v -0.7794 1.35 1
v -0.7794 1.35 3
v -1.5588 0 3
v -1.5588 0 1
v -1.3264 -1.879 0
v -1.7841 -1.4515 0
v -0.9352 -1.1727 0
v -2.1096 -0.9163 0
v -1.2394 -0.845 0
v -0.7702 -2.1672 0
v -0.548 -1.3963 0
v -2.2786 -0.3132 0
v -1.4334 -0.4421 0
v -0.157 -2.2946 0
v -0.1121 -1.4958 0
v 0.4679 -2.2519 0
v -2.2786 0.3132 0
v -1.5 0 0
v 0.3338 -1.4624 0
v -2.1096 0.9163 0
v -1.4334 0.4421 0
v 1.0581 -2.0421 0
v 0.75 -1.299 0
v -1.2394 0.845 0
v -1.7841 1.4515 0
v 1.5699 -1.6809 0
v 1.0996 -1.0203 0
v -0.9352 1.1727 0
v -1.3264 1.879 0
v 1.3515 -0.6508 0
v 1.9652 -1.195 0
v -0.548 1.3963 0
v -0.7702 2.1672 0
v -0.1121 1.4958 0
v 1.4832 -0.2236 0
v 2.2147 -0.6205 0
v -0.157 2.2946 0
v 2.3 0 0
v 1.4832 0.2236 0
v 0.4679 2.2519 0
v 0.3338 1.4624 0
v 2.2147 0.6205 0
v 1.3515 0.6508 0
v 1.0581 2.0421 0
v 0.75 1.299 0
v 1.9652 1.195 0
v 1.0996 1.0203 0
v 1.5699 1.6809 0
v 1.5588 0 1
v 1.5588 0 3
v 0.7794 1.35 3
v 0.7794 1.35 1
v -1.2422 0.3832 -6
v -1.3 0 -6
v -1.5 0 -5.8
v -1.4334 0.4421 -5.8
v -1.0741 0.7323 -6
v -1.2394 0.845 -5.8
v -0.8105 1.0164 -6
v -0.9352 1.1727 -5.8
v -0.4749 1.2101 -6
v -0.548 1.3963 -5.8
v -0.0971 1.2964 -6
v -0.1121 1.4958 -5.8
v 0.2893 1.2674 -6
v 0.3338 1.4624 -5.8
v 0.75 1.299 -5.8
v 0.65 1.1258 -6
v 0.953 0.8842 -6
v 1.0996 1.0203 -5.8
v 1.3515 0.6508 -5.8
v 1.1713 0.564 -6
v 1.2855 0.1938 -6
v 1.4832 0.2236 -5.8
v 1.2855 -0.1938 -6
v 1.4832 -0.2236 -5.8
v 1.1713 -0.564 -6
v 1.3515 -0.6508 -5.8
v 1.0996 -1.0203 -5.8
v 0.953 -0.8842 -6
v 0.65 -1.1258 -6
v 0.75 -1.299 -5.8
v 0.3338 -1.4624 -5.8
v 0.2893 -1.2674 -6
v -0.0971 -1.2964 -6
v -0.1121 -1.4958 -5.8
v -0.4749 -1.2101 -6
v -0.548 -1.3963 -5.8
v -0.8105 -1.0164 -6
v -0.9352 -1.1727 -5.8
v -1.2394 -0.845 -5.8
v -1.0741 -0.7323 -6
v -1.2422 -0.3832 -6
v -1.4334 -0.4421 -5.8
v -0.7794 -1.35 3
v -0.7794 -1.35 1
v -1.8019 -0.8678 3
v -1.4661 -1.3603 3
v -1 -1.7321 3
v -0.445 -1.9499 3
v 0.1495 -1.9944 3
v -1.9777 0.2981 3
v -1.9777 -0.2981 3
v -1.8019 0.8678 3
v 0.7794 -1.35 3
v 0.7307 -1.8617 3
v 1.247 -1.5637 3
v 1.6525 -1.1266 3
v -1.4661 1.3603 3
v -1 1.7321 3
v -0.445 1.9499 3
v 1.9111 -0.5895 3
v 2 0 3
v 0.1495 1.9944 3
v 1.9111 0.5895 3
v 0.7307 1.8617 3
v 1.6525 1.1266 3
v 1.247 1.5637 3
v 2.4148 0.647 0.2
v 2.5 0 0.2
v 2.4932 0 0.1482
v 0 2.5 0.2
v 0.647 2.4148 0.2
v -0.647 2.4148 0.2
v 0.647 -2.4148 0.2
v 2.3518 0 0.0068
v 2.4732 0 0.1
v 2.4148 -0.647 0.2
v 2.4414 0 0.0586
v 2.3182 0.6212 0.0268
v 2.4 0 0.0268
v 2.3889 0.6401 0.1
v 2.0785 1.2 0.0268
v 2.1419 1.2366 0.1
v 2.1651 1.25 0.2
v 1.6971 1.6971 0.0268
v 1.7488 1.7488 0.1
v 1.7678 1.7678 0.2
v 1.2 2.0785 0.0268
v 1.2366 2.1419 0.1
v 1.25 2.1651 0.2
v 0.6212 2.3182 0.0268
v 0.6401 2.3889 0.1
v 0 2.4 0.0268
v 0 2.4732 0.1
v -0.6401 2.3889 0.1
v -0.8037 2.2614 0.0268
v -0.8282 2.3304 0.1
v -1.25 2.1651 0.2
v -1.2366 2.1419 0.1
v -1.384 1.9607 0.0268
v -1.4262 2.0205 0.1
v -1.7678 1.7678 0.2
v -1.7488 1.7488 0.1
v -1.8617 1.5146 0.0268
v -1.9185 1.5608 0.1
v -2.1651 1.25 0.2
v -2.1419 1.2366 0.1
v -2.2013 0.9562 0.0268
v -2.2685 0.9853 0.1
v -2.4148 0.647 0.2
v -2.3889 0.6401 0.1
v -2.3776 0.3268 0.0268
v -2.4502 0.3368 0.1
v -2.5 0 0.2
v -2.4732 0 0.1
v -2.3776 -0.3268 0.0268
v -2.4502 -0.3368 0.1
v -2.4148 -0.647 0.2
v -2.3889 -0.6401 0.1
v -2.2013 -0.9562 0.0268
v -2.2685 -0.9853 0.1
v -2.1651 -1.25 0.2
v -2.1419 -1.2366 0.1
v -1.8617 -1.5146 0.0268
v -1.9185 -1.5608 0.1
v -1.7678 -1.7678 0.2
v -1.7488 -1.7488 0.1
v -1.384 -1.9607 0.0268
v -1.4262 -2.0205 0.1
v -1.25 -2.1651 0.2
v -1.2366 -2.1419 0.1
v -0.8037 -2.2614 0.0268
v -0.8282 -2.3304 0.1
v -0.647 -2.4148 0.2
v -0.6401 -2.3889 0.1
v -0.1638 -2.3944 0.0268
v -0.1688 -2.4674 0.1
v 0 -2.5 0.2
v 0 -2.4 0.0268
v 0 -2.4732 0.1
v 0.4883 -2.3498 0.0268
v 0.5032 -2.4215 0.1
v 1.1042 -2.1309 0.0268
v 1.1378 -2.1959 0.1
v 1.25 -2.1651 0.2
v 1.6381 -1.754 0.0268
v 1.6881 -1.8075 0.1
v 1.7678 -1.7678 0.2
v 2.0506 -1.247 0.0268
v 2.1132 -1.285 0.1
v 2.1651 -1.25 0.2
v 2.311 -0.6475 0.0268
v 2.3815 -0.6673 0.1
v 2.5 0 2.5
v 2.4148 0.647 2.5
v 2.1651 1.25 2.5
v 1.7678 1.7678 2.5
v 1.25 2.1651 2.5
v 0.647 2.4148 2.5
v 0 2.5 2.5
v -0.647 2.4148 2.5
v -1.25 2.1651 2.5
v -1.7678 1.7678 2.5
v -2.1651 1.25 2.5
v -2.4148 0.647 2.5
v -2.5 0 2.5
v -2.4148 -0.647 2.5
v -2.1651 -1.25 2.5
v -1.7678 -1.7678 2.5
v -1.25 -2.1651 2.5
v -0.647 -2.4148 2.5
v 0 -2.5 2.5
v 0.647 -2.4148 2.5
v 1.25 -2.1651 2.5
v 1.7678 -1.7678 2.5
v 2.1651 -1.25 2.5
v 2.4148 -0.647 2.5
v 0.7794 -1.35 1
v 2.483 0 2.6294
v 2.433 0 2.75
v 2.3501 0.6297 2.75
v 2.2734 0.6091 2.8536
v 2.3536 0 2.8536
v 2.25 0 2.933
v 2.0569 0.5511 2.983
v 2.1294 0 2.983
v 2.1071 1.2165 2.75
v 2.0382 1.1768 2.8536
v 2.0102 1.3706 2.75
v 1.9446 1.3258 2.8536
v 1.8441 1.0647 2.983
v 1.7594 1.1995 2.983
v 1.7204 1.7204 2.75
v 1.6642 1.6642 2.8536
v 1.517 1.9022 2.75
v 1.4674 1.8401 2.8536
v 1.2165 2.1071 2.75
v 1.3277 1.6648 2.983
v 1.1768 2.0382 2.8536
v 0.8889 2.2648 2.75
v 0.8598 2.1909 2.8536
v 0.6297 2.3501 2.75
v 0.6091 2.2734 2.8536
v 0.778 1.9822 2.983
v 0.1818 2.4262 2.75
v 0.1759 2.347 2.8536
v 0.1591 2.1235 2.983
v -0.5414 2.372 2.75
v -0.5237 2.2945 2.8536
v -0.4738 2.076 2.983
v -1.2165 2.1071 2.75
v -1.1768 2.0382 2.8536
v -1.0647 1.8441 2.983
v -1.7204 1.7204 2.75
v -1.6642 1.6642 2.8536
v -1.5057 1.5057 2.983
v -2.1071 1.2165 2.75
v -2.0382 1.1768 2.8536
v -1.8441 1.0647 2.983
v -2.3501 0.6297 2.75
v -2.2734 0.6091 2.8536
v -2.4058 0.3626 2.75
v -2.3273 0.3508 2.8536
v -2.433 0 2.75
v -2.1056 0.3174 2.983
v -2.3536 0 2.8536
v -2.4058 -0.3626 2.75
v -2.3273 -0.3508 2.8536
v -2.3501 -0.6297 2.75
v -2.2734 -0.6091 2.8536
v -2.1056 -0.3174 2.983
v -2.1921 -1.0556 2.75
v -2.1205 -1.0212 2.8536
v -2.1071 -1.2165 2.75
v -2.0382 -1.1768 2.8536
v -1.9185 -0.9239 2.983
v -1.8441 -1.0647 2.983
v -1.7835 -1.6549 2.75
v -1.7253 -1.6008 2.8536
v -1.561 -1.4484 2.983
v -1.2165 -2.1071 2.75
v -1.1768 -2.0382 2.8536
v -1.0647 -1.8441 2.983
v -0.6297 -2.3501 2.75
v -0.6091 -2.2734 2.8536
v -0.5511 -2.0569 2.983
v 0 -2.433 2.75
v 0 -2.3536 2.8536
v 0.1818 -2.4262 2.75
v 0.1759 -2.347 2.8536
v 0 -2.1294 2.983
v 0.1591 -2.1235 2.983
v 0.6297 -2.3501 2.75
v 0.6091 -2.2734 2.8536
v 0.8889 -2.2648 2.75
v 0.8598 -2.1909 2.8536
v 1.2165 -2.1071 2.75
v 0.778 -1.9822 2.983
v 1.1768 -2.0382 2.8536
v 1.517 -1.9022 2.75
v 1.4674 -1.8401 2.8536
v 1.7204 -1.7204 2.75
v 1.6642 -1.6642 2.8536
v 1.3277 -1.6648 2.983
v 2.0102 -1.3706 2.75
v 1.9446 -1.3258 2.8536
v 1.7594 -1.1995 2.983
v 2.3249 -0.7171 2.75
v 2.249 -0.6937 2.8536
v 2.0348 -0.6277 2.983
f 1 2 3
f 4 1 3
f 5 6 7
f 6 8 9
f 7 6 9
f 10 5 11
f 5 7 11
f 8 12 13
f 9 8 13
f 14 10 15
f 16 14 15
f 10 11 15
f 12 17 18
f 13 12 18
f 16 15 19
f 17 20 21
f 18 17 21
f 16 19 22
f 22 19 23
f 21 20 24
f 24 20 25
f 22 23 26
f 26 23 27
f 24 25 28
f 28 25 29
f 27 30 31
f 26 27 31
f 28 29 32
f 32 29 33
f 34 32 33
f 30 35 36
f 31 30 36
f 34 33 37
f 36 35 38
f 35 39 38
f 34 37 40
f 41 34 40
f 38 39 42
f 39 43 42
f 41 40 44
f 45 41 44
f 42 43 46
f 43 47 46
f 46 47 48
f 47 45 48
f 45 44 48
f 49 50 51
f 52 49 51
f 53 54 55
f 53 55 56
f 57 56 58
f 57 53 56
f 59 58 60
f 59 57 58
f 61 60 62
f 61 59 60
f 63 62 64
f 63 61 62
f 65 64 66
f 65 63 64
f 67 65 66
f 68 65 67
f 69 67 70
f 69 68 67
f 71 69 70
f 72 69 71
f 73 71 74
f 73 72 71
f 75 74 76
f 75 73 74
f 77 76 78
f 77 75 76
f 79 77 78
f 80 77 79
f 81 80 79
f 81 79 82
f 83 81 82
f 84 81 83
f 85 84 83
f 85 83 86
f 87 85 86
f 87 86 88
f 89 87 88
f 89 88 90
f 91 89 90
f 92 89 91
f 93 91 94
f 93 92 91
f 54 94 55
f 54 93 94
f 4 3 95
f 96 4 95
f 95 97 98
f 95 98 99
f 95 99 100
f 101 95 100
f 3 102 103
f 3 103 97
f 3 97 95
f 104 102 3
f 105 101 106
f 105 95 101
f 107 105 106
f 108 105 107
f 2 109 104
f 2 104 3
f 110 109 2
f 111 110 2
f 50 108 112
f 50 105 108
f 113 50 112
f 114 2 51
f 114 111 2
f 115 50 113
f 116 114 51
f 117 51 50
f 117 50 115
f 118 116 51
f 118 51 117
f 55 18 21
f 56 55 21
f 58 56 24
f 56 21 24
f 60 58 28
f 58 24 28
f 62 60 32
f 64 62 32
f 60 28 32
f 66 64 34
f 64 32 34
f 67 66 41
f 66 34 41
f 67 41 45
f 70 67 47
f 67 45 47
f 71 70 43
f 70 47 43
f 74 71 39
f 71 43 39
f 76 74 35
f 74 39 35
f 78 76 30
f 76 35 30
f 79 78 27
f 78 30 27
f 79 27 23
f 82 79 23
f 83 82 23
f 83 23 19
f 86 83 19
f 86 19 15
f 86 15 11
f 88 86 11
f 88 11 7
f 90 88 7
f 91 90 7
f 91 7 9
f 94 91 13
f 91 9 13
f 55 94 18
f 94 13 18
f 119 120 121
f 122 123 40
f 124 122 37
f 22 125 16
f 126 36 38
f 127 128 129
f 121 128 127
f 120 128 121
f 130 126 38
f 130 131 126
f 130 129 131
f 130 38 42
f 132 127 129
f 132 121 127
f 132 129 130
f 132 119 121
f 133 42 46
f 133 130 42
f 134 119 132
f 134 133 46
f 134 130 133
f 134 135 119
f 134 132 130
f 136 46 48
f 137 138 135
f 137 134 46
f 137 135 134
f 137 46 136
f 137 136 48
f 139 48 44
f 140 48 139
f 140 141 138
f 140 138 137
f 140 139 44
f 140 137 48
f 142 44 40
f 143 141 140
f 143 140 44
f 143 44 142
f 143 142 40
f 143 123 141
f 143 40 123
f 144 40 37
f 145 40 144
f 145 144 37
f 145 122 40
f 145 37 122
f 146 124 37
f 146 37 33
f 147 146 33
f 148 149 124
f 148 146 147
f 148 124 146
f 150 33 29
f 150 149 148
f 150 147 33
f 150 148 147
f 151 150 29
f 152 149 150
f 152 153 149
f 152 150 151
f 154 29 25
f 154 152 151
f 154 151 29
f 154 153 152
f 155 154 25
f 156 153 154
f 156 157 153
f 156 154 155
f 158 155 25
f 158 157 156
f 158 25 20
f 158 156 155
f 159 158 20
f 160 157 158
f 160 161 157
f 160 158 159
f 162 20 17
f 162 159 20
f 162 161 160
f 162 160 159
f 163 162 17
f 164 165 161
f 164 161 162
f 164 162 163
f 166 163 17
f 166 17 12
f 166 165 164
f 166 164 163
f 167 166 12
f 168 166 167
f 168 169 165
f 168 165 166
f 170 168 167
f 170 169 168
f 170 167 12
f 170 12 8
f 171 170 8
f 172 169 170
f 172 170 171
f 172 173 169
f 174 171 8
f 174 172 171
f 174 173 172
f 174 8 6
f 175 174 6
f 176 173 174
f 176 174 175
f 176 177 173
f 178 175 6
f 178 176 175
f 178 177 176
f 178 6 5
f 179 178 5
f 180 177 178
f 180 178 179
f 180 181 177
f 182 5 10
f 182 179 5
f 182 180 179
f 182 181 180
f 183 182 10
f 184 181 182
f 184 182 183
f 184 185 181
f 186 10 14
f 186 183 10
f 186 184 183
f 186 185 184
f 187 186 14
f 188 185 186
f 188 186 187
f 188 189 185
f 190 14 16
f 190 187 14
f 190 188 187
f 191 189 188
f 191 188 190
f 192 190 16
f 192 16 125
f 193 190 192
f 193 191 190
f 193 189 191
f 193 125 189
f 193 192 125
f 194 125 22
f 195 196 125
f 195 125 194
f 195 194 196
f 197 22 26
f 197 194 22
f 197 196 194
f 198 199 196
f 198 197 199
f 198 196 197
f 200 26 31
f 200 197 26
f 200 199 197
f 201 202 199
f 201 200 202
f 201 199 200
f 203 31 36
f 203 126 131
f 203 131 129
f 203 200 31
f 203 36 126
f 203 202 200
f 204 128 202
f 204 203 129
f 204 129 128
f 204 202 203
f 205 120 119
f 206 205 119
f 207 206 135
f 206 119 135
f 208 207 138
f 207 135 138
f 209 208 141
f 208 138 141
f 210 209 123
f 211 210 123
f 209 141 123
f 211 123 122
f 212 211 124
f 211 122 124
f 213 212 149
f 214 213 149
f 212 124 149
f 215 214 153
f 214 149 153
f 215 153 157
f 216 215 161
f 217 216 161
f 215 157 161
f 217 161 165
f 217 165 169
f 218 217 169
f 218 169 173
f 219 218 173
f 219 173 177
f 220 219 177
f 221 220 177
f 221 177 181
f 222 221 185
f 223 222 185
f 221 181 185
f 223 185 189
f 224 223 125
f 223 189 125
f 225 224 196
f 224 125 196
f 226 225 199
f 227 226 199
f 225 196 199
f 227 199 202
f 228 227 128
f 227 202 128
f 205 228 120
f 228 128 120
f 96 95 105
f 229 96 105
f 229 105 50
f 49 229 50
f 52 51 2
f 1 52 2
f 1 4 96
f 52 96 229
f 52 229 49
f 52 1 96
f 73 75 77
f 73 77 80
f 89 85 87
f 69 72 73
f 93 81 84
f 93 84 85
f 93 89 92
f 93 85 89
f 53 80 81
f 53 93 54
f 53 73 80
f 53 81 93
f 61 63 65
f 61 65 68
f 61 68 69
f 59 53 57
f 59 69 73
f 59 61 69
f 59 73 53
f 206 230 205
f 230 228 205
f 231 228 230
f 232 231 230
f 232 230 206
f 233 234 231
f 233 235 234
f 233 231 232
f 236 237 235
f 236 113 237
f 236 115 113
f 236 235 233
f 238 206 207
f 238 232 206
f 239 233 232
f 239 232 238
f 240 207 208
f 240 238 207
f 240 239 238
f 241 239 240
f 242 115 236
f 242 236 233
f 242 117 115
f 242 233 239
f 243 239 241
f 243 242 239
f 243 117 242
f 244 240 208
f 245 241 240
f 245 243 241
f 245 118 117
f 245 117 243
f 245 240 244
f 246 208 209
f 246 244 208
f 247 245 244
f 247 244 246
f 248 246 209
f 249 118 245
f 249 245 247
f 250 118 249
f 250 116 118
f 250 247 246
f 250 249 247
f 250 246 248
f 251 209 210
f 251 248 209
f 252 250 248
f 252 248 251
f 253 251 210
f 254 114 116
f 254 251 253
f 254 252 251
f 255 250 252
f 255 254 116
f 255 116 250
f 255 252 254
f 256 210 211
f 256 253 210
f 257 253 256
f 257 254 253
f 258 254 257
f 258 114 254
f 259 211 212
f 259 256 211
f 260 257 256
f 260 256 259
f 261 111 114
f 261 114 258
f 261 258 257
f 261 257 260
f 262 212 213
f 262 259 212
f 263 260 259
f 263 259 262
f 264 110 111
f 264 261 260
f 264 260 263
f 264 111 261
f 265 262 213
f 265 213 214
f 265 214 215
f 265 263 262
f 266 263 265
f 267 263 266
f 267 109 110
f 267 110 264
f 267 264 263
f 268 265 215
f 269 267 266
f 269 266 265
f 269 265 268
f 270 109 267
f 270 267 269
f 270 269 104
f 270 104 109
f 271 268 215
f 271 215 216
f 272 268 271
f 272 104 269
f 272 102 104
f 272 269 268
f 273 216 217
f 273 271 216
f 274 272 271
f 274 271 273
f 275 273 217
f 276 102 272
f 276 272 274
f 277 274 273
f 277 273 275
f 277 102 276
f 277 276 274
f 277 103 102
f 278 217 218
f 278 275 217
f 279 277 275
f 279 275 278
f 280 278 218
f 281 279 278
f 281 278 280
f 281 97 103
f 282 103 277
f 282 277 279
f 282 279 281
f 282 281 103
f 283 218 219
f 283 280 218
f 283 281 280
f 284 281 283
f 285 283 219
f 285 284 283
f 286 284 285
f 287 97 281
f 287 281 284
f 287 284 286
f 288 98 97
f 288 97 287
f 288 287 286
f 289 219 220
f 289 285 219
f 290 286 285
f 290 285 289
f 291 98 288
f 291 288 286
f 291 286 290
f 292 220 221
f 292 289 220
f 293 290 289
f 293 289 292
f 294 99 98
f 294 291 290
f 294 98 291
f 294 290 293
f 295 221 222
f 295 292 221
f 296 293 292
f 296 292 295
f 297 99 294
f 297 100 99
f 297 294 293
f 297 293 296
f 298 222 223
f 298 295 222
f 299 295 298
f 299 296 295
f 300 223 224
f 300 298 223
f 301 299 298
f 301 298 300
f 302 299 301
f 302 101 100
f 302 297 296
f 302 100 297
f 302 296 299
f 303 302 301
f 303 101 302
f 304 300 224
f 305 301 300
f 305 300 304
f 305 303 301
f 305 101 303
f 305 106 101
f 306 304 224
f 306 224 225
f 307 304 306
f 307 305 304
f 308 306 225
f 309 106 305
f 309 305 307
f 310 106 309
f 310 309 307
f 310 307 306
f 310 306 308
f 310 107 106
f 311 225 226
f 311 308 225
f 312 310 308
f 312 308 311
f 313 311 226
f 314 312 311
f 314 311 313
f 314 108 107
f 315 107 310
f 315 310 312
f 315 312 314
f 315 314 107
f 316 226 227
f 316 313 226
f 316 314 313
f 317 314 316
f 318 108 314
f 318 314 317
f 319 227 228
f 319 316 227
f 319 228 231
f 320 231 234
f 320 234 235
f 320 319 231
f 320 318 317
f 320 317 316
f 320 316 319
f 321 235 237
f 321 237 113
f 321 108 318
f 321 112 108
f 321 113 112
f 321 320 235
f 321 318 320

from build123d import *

# Parameters (mm, degrees)
SKETCH_1_R          = 2.5
EXTRUDE_1_DEPTH     = 3
FILLET_1_R          = 0.5
CUT_EXTRUDE_1_DEPTH = 2
SKETCH_3_R          = 1.5
EXTRUDE_2_DEPTH     = 6
CHAMFER_1_SIZE      = 0.2
FILLET_2_R          = 0.2


with BuildPart() as part:
    # 草图1 → 凸台-拉伸1 (new body)
    with BuildSketch(Plane.XY):
        Circle(SKETCH_1_R)
    extrude(amount=EXTRUDE_1_DEPTH)

    # 圆角1
    fillet_1_edges = [part.edges().sort_by_distance(p)[0] for p in [
        (-2.5, 0, 3),
    ]]
    fillet(fillet_1_edges, radius=FILLET_1_R)

    # 草图2 → 切除-拉伸1 (cut)
    with BuildSketch(Plane.XY.offset(3)):
        Polygon((1.558845727, 0), (0.779422863, 1.35), (-0.779422863, 1.35), (-1.558845727, 0), (-0.779422863, -1.35), (0.779422863, -1.35), align=None)
    extrude(amount=-CUT_EXTRUDE_1_DEPTH, mode=Mode.SUBTRACT)

    # 草图3 → 凸台-拉伸2 (add)
    with BuildSketch(Plane(origin=(0, 0, 0), x_dir=(-1, 0, 0), z_dir=(0, 0, -1))):
        Circle(SKETCH_3_R)
    extrude(amount=EXTRUDE_2_DEPTH)

    # 倒角1
    chamfer_1_edges = [part.edges().sort_by_distance(p)[0] for p in [
        (1.5, 0, -6),
    ]]
    chamfer(chamfer_1_edges, length=CHAMFER_1_SIZE)

    # 圆角2
    fillet_2_edges = [part.edges().sort_by_distance(p)[0] for p in [
        (-2.5, 0, 0),
    ]]
    fillet(fillet_2_edges, radius=FILLET_2_R)


solid = part.part
